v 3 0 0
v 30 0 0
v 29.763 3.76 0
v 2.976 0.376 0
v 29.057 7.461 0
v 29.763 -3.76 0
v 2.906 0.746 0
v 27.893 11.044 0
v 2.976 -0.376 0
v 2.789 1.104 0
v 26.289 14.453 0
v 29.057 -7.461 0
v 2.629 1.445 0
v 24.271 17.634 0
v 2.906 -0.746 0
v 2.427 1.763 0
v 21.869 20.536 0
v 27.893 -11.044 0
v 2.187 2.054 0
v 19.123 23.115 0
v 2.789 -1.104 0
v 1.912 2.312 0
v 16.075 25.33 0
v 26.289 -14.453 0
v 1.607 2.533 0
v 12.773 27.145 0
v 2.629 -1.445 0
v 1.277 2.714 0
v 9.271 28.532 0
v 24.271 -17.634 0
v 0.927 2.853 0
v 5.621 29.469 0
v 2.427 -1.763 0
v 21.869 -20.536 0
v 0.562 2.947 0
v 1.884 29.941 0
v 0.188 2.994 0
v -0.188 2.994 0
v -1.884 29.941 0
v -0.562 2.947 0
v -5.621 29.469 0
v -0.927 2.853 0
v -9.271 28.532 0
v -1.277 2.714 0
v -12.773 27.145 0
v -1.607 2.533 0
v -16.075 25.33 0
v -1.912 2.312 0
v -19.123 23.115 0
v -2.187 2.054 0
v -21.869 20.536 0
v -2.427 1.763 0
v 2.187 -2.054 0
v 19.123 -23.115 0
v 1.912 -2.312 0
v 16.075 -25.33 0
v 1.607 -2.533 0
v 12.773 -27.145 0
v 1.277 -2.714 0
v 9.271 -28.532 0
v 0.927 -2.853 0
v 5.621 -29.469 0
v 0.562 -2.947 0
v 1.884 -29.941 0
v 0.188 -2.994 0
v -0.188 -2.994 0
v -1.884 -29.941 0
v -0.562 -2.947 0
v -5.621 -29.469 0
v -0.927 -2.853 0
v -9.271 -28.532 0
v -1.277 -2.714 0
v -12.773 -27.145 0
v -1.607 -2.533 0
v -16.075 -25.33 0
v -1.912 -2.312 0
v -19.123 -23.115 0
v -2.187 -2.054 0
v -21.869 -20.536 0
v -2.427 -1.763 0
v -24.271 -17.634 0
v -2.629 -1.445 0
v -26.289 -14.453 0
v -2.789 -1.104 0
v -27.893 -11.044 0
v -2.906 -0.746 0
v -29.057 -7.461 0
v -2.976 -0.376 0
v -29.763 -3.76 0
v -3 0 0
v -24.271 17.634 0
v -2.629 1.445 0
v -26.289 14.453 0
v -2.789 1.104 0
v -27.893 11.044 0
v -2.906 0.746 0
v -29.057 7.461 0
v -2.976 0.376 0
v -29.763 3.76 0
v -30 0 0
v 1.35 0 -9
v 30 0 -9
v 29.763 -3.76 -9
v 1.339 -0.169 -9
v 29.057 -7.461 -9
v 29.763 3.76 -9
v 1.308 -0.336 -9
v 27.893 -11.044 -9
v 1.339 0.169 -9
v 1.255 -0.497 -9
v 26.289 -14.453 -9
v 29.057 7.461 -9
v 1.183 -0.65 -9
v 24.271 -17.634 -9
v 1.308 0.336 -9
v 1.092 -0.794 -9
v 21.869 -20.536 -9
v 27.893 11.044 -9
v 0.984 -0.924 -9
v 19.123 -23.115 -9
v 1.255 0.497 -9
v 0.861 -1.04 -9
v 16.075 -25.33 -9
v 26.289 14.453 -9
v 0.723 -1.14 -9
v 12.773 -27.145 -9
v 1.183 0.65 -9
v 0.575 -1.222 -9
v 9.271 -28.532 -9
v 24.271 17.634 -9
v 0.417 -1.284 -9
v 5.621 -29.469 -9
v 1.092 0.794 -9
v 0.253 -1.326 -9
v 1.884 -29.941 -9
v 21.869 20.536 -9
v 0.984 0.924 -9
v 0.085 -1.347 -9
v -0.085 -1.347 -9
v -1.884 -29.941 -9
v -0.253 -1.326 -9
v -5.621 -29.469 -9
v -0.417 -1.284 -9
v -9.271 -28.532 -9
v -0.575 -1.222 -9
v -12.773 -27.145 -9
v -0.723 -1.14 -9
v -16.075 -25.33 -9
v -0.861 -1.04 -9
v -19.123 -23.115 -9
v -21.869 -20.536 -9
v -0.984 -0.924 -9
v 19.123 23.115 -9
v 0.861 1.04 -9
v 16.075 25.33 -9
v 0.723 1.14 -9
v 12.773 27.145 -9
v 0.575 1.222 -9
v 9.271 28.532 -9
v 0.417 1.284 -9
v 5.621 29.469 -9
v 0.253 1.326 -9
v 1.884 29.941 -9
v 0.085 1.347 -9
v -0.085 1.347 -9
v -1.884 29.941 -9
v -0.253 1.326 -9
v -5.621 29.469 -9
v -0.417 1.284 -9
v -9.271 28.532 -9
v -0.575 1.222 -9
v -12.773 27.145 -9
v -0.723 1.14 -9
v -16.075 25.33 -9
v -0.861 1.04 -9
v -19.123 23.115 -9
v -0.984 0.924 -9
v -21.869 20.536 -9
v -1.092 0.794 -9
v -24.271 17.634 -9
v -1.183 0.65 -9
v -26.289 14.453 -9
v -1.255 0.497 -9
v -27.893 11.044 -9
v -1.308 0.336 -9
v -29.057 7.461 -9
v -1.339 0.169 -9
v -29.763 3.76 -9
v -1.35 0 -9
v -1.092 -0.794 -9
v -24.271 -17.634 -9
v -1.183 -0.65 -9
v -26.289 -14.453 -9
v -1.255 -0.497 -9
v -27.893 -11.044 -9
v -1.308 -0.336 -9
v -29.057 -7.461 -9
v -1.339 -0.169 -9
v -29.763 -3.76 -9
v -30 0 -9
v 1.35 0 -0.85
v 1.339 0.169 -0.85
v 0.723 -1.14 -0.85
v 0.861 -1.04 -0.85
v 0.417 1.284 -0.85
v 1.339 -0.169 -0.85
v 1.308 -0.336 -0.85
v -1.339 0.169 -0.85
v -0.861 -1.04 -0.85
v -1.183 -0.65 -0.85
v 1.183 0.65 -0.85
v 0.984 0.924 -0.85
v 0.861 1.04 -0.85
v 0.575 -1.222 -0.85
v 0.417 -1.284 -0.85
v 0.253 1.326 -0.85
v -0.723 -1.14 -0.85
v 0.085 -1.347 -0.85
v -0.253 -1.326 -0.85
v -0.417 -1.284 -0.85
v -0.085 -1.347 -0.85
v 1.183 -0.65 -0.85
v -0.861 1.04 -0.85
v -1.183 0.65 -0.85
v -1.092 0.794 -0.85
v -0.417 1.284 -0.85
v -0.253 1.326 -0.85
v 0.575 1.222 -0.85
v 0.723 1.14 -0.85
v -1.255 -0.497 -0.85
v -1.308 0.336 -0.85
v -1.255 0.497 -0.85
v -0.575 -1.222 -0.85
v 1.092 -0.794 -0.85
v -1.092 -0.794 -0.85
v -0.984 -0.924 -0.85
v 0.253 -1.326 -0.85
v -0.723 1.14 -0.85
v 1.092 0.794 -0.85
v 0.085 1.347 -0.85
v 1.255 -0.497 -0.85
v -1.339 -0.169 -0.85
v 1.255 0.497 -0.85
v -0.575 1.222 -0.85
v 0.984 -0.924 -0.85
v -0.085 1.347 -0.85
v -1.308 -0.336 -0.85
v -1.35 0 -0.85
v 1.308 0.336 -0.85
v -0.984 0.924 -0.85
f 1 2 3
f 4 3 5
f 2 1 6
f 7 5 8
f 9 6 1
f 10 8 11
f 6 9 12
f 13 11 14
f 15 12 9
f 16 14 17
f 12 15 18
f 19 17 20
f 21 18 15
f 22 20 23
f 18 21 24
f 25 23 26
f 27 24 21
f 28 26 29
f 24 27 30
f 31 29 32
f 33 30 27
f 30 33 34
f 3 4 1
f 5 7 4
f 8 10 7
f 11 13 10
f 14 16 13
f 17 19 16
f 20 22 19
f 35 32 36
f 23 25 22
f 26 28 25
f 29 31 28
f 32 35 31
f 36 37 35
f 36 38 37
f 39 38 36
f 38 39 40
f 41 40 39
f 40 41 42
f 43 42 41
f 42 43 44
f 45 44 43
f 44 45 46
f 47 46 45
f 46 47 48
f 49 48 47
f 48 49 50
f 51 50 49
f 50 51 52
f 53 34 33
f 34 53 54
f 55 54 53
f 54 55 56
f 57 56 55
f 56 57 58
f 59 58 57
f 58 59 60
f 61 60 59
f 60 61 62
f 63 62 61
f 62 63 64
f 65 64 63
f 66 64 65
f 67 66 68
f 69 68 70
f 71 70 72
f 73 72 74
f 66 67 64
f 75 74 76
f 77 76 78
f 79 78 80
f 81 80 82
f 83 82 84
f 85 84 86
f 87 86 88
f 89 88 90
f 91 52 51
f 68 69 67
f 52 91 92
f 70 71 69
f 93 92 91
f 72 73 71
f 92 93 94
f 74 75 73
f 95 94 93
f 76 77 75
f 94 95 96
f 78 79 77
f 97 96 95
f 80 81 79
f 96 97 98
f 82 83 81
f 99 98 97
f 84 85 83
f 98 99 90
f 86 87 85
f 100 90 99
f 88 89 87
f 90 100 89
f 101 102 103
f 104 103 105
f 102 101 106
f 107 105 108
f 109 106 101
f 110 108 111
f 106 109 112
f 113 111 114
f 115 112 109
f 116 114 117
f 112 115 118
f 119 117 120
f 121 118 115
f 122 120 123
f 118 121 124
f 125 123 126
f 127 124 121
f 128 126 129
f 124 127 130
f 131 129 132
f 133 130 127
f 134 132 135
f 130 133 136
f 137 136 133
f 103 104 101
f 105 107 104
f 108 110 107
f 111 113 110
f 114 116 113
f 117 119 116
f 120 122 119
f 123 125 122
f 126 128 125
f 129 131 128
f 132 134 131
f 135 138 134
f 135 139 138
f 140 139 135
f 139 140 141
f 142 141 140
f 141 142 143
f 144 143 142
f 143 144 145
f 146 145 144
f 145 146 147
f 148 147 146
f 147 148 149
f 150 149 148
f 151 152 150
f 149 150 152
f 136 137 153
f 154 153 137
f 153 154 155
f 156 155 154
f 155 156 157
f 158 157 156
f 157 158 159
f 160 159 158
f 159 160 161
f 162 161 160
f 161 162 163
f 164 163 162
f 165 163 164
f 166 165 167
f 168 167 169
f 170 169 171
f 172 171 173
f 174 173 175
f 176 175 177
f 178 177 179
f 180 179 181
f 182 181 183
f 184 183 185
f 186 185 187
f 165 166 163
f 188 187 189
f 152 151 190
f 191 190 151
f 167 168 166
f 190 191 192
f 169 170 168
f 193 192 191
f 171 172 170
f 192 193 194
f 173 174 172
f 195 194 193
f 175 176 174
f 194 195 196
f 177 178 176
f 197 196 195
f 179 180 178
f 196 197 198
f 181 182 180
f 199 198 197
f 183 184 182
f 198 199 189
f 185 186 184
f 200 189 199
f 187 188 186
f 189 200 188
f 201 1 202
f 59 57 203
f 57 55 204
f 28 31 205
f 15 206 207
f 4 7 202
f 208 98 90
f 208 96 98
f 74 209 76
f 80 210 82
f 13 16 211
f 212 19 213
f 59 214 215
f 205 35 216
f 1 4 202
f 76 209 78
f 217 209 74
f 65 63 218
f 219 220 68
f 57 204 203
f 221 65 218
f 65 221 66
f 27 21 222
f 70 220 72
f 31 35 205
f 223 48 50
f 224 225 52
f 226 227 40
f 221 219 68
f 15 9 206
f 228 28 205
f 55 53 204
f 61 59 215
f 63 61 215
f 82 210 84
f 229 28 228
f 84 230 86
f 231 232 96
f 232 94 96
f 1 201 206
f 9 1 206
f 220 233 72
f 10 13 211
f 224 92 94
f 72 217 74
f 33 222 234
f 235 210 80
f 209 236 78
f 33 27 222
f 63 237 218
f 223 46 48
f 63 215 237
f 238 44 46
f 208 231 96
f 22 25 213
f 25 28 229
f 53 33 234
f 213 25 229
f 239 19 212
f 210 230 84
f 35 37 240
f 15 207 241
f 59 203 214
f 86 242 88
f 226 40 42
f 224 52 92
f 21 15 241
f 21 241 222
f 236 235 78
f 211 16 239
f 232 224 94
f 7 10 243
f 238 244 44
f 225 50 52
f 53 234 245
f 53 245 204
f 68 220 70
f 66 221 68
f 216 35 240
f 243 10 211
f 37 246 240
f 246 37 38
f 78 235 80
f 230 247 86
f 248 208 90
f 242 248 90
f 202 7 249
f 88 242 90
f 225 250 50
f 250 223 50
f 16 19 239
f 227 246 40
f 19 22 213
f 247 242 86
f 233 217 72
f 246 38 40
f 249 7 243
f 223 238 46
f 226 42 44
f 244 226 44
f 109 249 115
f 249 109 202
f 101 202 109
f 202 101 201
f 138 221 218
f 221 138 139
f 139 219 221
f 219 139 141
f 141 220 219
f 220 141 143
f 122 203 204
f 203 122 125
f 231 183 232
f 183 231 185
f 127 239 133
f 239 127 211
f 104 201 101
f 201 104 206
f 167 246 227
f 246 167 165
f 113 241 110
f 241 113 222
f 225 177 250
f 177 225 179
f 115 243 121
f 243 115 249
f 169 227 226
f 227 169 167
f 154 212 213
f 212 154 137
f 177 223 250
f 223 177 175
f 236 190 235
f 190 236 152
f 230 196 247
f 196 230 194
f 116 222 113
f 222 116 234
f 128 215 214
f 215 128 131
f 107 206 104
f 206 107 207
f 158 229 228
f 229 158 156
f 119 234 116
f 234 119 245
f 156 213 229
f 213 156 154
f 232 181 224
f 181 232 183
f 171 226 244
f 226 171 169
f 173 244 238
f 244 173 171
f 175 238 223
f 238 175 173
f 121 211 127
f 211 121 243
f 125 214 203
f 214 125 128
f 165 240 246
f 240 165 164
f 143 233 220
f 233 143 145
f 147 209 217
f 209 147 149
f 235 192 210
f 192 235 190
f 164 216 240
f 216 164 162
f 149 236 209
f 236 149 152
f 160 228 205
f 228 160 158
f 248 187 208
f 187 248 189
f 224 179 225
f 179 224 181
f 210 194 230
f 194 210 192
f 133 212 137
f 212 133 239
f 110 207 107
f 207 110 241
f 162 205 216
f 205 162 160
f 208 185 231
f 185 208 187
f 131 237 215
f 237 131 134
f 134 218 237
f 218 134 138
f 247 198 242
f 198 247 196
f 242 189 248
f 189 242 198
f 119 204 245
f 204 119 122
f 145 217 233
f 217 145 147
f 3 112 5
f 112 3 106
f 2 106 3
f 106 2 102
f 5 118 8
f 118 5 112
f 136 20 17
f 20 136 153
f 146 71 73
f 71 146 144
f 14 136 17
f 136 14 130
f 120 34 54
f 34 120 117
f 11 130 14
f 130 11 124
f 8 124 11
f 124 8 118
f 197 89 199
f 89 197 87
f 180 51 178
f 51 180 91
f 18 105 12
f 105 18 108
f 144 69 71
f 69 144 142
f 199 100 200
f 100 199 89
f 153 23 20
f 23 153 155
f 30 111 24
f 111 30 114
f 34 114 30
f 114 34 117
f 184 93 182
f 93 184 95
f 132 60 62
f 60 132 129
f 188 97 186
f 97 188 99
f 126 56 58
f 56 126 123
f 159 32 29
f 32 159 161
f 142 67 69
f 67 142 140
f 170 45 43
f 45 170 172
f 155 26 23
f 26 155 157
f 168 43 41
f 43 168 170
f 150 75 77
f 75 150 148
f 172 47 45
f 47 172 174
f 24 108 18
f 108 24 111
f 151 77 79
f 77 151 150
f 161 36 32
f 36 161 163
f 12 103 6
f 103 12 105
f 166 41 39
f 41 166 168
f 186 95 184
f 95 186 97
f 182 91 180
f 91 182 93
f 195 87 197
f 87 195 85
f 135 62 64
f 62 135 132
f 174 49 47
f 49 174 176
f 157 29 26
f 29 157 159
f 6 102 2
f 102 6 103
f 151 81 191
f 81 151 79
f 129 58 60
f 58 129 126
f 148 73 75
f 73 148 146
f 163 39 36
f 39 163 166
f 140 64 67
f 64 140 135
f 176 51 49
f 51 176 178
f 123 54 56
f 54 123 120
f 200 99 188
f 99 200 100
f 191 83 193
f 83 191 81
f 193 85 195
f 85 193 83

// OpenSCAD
$fn = 50;


difference() {
	union() {
		translate(v = [0, 0, -9.0000000000]) {
			cylinder(h = 9, r = 30.0000000000);
		}
	}
	union() {
		translate(v = [0, 0, 0]) {
			rotate(a = [0, 0, 0]) {
				difference() {
					union() {
						translate(v = [0, 0, -9.0000000000]) {
							cylinder(h = 9, r = 1.0000000000);
						}
						translate(v = [0, 0, -0.8500000000]) {
							cylinder(h = 0.8500000000, r1 = 1.3500000000, r2 = 3.0000000000);
						}
						translate(v = [0, 0, -9.0000000000]) {
							cylinder(h = 9, r = 1.3500000000);
						}
						translate(v = [0, 0, -9.0000000000]) {
							cylinder(h = 9, r = 1.0000000000);
						}
					}
					union();
				}
			}
		}
	}
}
